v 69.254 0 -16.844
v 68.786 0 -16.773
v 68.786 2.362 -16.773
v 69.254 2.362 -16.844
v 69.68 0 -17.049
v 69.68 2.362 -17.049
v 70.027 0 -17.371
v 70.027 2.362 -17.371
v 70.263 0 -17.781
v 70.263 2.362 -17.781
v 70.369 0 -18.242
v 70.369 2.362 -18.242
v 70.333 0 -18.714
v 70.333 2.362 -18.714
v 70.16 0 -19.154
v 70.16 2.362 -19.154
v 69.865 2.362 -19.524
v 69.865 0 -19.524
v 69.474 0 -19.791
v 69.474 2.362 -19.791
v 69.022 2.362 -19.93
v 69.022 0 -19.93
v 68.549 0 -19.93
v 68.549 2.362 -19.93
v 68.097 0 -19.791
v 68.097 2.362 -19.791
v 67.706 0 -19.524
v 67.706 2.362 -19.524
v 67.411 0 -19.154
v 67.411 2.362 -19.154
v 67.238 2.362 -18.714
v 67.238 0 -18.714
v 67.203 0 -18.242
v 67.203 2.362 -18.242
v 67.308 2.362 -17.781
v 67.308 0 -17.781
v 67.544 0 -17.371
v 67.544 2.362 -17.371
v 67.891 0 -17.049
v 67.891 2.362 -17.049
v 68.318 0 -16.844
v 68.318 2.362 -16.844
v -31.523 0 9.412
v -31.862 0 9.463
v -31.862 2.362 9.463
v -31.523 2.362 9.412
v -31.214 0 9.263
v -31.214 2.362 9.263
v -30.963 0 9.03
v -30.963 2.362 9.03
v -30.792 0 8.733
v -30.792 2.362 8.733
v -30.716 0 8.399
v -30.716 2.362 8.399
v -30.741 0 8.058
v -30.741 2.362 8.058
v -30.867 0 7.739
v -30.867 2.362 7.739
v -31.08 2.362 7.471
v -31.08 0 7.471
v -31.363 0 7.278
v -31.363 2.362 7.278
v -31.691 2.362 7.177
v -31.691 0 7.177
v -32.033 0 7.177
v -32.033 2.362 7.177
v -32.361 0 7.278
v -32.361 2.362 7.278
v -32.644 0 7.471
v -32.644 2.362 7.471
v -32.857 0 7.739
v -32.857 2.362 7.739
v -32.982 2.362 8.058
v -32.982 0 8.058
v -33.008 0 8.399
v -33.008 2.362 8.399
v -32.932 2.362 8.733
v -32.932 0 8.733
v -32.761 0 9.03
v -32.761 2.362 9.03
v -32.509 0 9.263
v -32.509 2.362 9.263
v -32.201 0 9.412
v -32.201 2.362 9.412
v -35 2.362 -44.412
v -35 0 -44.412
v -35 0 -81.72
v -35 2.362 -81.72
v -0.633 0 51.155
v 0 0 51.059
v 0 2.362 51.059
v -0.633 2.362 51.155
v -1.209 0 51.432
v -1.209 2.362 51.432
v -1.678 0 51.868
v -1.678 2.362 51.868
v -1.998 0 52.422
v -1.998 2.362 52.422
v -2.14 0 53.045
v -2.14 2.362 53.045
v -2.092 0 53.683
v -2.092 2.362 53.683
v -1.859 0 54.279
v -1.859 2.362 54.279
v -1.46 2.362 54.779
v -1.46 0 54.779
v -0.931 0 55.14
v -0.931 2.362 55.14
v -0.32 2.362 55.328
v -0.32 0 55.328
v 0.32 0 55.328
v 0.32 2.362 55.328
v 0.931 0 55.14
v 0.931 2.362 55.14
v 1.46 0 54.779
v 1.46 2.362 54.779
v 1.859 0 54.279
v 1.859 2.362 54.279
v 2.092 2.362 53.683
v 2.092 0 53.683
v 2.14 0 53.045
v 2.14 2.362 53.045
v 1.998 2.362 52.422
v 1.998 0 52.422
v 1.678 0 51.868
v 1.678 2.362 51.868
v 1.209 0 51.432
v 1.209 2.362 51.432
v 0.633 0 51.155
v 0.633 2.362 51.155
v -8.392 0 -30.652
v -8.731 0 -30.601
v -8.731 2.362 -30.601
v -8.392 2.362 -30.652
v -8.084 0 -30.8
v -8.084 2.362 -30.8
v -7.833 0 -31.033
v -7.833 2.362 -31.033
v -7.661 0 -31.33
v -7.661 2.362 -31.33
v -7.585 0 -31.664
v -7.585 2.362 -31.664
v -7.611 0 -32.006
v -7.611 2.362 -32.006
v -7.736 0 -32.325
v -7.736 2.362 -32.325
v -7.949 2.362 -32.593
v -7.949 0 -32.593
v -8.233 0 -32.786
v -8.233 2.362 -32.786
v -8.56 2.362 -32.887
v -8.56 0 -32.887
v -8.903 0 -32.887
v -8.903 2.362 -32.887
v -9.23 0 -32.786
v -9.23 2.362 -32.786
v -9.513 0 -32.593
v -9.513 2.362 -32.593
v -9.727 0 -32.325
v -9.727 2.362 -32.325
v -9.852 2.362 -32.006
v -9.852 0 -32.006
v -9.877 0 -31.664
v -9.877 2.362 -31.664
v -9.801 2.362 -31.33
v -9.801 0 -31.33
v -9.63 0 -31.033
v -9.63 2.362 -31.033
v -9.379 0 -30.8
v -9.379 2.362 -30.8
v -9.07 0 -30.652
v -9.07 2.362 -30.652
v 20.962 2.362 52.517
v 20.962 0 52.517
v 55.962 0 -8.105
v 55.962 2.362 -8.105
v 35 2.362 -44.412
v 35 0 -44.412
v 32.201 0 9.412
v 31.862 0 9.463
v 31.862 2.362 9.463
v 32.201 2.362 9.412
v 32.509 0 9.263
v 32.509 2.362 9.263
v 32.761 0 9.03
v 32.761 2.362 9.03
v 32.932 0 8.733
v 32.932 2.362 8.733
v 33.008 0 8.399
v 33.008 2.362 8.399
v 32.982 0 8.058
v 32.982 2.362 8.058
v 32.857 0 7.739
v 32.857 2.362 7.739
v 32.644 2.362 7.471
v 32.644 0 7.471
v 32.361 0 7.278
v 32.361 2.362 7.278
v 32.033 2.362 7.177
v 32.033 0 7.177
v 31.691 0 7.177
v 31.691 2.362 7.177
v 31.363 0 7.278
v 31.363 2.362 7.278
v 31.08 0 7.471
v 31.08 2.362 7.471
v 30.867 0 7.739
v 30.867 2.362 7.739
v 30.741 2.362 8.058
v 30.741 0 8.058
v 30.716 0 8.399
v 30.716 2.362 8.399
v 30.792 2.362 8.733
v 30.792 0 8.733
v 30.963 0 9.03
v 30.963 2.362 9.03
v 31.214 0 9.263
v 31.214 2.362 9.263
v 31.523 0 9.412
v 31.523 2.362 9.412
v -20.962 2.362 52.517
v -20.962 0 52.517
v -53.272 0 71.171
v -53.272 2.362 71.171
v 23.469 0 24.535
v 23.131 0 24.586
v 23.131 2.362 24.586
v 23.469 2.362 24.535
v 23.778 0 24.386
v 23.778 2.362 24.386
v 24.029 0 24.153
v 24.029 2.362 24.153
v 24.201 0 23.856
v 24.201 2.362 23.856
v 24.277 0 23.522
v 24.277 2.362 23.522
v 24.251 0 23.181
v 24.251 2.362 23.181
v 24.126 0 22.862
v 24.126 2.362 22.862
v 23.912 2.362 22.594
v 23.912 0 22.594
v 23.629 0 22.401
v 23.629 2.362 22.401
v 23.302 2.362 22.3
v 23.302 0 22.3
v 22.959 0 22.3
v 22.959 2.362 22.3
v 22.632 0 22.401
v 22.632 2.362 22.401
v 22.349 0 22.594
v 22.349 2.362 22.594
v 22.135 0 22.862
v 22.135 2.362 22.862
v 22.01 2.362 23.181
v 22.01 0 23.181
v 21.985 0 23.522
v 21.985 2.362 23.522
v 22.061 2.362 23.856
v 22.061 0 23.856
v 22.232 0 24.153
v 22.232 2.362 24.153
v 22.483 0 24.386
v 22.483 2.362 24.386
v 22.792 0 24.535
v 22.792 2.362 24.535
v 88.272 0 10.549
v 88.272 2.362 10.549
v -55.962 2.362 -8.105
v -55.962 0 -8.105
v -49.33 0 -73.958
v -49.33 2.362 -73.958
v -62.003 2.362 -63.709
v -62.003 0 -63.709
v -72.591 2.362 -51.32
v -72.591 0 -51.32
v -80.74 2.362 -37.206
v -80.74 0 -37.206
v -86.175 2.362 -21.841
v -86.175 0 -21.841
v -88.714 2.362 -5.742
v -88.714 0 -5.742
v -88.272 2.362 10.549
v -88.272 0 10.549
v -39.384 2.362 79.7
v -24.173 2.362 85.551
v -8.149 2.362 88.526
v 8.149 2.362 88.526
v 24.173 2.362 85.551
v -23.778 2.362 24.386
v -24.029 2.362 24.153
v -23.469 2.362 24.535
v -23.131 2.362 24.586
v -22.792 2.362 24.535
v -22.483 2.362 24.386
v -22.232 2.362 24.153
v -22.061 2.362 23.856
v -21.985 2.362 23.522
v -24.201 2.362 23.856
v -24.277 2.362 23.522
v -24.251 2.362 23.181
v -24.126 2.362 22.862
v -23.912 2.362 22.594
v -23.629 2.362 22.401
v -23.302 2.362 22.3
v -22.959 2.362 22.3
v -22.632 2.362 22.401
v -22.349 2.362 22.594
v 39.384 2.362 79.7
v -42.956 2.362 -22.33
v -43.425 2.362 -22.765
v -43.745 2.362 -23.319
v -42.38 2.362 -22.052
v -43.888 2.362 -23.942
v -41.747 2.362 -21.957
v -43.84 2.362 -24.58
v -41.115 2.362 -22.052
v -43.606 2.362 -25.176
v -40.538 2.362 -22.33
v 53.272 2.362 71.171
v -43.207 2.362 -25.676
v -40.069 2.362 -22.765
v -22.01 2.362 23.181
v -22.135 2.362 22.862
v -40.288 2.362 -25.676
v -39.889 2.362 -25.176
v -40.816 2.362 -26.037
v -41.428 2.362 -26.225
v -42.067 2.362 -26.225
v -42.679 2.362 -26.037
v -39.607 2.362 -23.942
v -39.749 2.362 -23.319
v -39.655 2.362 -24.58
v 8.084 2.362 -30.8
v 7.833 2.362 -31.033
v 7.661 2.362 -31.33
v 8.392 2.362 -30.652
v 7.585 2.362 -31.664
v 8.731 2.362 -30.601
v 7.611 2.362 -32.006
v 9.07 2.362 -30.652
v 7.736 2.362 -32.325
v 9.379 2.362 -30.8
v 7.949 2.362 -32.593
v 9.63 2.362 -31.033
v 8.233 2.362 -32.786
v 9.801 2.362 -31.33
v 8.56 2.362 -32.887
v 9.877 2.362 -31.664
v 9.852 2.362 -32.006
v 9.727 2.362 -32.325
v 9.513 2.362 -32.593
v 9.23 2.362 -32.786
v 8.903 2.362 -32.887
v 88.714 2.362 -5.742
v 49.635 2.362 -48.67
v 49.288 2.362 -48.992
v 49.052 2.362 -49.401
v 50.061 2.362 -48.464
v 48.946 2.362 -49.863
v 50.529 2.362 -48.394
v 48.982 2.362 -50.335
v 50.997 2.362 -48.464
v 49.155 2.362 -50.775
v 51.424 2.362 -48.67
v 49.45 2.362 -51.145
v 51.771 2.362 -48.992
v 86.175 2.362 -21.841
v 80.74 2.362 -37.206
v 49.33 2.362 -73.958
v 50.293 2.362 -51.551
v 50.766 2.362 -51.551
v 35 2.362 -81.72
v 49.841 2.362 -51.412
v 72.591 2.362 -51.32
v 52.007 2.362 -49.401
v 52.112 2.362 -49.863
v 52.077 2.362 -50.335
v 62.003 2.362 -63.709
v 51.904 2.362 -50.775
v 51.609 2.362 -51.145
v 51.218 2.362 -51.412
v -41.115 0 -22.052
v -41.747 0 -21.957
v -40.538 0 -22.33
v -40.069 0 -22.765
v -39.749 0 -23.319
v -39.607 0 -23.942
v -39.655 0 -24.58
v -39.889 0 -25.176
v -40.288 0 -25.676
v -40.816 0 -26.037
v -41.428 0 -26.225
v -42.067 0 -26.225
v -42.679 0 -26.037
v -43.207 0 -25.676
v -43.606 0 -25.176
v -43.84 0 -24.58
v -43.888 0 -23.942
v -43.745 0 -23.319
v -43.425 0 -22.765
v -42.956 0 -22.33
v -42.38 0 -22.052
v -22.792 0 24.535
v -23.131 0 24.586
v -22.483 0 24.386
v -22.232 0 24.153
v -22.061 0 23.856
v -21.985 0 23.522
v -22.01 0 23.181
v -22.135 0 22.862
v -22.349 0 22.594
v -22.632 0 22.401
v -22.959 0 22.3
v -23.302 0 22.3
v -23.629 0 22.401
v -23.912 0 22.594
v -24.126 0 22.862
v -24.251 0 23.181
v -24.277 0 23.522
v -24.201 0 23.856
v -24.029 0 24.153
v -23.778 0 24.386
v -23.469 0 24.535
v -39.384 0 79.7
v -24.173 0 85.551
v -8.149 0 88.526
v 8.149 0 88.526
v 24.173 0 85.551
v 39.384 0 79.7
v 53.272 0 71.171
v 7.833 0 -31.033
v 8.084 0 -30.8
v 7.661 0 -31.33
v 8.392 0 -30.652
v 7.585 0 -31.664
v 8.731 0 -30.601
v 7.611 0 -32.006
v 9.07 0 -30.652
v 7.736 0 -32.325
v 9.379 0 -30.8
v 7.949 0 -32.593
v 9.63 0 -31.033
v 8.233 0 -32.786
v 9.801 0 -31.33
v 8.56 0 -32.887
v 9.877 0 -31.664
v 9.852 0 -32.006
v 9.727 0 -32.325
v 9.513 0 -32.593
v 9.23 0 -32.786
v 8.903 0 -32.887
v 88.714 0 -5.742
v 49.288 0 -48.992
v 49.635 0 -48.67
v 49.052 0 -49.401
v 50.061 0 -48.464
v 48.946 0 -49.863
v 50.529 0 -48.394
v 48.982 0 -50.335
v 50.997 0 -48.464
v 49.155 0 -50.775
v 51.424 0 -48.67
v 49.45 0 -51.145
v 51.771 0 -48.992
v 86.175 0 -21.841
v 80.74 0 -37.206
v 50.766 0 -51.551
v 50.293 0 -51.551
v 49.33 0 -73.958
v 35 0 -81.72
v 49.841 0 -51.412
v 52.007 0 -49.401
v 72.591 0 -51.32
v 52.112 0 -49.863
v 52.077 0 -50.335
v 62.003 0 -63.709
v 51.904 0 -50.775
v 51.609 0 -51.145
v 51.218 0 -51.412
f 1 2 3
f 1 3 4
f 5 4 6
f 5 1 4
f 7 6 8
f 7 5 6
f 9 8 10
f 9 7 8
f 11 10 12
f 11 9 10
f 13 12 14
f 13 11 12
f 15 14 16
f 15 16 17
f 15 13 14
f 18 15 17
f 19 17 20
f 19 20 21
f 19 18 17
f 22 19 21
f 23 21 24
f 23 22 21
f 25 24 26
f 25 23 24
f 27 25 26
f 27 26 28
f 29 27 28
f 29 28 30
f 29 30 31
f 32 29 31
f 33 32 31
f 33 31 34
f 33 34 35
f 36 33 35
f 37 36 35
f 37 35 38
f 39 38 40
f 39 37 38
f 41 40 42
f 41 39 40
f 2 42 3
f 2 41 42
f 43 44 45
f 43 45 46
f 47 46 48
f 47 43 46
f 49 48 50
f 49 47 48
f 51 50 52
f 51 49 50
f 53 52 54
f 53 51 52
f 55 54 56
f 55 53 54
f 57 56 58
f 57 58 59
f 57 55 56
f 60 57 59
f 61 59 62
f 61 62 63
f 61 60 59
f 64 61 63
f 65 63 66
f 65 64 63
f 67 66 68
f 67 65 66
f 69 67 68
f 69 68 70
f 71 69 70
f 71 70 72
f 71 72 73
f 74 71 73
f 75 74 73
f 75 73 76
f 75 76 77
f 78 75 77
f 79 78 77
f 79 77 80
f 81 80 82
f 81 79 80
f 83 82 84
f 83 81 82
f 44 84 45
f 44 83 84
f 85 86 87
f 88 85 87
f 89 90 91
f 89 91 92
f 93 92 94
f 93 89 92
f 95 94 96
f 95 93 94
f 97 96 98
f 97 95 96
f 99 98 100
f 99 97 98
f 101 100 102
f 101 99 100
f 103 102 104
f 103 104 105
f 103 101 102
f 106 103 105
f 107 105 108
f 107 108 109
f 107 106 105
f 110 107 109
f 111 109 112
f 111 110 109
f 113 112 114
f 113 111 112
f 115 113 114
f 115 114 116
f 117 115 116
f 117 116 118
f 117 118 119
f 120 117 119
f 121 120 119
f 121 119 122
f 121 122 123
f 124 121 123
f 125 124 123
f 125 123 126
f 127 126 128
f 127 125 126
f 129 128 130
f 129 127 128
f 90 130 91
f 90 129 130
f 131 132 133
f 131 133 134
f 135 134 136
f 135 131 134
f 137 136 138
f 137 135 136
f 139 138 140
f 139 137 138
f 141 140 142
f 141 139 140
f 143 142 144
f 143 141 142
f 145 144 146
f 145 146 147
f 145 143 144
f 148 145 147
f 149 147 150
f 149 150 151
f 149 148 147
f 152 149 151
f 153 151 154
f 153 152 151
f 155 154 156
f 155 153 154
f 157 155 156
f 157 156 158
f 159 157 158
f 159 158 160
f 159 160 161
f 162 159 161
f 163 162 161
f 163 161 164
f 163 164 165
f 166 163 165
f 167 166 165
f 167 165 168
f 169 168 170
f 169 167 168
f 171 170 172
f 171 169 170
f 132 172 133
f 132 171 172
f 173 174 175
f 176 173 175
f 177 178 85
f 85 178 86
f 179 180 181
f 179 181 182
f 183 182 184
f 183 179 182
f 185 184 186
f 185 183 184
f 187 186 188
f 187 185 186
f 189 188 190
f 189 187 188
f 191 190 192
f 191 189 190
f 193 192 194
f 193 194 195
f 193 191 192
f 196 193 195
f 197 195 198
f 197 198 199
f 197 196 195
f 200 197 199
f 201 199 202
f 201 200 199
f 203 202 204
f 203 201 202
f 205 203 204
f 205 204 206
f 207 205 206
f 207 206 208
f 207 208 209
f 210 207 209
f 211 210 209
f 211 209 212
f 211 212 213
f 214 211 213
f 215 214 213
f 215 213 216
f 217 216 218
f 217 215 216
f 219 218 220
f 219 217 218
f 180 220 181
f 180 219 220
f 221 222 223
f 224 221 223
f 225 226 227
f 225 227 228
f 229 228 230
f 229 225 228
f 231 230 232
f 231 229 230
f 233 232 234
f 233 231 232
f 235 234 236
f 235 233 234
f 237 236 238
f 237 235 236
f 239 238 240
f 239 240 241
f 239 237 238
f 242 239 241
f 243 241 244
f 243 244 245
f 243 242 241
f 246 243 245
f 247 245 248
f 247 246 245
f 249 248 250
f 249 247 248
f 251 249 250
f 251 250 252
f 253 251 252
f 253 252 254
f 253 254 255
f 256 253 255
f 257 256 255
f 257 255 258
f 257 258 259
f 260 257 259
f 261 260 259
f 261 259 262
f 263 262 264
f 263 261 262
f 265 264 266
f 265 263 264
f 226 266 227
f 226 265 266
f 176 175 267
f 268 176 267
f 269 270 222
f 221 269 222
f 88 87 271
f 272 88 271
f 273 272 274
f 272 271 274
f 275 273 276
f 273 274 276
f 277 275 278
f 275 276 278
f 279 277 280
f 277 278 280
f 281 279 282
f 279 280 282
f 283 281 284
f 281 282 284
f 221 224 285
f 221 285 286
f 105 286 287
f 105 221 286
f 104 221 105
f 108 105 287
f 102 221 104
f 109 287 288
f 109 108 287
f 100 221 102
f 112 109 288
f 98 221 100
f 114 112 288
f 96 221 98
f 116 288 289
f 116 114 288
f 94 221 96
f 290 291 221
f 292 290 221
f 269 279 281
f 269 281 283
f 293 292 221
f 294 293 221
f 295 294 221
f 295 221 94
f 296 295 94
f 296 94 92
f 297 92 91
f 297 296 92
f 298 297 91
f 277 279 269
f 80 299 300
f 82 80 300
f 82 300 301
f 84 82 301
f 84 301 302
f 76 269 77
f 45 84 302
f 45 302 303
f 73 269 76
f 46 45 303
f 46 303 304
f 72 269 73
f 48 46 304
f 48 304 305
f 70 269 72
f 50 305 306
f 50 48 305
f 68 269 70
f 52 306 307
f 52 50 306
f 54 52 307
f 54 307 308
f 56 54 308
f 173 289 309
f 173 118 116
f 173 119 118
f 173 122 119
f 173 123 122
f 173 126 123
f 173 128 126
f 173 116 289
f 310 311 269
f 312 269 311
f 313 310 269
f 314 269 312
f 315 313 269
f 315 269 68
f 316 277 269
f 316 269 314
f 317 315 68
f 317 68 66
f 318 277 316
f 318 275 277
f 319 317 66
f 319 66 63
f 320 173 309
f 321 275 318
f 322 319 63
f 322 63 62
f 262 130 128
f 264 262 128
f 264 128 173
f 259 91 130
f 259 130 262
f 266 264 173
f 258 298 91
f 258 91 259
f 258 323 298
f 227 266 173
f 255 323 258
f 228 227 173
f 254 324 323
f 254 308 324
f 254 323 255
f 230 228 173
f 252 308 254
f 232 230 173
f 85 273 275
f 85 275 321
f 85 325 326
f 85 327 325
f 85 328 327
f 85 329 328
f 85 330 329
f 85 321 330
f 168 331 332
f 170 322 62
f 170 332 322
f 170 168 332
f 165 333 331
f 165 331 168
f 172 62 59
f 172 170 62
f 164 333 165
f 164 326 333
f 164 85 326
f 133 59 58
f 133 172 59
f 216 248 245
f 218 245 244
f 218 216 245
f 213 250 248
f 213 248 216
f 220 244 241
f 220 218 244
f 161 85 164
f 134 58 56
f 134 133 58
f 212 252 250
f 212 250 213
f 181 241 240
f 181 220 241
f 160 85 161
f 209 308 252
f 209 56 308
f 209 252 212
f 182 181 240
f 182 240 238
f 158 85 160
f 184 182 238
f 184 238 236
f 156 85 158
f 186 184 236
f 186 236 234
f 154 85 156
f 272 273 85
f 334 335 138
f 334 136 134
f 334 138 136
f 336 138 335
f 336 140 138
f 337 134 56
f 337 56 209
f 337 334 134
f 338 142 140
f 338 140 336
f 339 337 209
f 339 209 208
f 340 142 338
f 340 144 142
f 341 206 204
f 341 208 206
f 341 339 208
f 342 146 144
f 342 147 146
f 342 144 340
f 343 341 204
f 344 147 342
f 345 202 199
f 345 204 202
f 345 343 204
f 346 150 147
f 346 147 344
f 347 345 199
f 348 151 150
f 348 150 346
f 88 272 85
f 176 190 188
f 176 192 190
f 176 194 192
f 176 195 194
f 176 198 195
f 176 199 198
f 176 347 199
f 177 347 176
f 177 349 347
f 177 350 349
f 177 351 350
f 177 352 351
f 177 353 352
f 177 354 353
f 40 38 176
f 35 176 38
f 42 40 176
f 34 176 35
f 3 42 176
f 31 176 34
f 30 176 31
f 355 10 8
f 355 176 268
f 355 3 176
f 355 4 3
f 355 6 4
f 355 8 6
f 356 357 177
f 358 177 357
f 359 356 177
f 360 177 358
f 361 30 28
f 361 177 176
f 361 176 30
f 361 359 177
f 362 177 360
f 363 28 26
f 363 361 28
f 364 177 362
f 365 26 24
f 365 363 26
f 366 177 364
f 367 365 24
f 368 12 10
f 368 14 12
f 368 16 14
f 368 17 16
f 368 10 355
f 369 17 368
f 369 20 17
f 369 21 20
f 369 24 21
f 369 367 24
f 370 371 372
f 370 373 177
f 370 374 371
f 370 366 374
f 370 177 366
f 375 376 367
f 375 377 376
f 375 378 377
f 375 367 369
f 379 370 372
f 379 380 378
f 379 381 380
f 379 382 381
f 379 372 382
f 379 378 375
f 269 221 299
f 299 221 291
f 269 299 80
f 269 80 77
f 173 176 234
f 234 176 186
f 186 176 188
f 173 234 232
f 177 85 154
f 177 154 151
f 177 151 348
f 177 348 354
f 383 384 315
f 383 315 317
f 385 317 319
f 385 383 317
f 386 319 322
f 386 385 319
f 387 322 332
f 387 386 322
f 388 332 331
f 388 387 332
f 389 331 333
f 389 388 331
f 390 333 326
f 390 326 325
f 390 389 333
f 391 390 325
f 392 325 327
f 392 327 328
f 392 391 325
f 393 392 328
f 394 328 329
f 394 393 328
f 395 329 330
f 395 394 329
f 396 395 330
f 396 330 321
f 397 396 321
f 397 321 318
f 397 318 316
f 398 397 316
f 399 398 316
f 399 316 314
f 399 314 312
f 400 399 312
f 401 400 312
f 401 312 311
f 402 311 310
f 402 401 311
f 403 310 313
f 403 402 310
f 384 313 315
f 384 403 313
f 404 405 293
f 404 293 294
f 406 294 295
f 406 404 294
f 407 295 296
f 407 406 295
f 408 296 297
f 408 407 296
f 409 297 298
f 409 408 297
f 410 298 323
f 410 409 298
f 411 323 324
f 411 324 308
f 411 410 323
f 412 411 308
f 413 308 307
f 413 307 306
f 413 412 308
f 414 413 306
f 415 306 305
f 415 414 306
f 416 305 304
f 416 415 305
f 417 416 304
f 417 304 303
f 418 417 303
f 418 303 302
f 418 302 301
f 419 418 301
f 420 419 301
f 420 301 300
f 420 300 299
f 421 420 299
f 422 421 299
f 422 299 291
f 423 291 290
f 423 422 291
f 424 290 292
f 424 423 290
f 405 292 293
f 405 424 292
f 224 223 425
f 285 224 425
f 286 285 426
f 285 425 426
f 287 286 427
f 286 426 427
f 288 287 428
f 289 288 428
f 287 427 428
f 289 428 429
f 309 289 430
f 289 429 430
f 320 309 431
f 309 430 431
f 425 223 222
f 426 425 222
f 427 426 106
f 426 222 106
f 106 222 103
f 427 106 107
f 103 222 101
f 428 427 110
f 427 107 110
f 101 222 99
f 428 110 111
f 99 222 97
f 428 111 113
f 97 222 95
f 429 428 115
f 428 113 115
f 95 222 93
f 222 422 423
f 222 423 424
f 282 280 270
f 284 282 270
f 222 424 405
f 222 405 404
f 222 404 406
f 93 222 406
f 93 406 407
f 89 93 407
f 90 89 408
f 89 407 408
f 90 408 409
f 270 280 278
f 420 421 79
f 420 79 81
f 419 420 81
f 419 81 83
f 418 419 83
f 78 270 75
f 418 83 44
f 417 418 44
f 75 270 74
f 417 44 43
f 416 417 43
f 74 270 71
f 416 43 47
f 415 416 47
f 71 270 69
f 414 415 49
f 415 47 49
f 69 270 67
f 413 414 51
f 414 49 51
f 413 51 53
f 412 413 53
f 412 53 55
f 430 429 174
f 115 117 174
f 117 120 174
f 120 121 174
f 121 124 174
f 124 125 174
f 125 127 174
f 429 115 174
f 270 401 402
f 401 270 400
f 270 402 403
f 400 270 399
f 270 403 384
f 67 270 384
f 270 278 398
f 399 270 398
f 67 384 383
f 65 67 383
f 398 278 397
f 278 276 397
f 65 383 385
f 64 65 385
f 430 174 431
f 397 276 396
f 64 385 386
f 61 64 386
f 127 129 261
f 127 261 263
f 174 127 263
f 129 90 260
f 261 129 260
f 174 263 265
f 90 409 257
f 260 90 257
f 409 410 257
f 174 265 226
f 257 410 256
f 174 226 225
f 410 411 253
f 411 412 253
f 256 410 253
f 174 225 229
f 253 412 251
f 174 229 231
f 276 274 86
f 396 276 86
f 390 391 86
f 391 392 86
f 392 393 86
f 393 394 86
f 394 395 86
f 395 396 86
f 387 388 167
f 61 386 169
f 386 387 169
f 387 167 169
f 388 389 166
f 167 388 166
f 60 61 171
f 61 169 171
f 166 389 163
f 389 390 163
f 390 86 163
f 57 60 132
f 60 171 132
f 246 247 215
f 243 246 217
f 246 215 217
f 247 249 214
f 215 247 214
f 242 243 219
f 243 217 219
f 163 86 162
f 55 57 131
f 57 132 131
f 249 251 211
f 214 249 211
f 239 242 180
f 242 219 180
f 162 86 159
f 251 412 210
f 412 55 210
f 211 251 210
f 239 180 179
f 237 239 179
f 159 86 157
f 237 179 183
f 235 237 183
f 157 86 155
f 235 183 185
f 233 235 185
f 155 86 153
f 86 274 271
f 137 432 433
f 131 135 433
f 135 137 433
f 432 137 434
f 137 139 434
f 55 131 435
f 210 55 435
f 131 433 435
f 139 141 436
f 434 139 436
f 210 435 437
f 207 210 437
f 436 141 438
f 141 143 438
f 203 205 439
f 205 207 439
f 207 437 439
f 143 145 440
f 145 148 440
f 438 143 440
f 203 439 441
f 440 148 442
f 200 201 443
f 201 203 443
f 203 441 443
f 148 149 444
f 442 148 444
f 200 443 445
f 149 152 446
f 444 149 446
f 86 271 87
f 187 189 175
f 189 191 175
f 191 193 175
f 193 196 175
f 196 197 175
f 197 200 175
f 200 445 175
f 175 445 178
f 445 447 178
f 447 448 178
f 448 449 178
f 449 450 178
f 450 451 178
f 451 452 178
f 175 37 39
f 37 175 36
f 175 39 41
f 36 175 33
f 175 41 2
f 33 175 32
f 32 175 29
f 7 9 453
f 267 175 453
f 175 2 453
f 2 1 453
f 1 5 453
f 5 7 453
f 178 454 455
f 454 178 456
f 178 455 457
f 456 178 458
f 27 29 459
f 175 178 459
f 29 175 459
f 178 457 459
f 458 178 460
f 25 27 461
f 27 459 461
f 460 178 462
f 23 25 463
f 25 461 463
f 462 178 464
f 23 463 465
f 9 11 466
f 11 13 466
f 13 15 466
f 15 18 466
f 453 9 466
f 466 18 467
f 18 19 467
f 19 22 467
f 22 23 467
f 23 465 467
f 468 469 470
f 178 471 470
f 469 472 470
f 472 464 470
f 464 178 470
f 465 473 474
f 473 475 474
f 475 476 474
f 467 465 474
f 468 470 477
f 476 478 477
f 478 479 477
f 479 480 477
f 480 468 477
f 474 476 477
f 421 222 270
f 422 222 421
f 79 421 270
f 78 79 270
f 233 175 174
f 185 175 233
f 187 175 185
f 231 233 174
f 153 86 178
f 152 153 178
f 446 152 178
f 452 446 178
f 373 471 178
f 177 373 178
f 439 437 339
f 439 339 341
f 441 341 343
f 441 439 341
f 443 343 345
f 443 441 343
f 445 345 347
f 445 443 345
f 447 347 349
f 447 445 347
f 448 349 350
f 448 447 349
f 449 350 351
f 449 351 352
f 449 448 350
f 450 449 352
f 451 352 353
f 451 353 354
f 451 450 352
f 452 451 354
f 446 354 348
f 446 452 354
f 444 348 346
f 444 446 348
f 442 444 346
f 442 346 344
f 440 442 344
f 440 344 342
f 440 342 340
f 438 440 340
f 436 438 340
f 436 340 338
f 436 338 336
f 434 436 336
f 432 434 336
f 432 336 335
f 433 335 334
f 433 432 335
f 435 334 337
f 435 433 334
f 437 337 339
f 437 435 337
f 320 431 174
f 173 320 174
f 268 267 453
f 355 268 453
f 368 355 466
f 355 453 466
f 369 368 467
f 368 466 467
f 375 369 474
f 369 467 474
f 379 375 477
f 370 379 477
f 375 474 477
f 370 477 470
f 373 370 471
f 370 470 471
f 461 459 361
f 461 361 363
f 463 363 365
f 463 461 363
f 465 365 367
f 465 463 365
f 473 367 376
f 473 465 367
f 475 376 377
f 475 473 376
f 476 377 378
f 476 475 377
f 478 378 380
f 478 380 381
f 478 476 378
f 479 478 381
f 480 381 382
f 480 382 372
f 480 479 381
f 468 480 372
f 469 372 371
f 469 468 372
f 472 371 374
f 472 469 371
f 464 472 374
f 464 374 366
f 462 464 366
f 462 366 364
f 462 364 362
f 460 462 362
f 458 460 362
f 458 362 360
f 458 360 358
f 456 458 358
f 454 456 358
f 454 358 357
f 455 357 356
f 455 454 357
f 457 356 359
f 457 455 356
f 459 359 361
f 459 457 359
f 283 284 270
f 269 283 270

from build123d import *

# Parameters (mm, degrees)
SKETCH1_R           = 2.1463
SKETCH1_R_2         = 1.14935
SKETCH1_R_3         = 1.5875
BOSS_EXTRUDE1_DEPTH = 2.3622


with BuildPart() as part:
    # Sketch1 → Boss-Extrude1 (new body)
    with BuildSketch(Plane(origin=(0, 0, 0), x_dir=(1, 0, 0), z_dir=(0, 1, 0))):
        with BuildLine():
            Line((-35, 44.411902139), (-35, 81.720315712))
            ThreePointArc((-35, 81.720315712), (-76.989658396, 44.45), (-88.271869412, -10.549268723))
            Line((-88.271869412, -10.549268723), (-55.961835482, 8.104938063))
            Line((-55.961835482, 8.104938063), (-20.961835482, -52.516840202))
            Line((-20.961835482, -52.516840202), (-53.271869412, -71.171046988))
            ThreePointArc((-53.271869412, -71.171046988), (0, -88.9), (53.271869412, -71.171046988))
            Line((53.271869412, -71.171046988), (20.961835482, -52.516840202))
            Line((20.961835482, -52.516840202), (55.961835482, 8.104938063))
            Line((55.961835482, 8.104938063), (88.271869412, -10.549268723))
            ThreePointArc((88.271869412, -10.549268723), (76.989658396, 44.45), (35, 81.720315712))
            Line((35, 81.720315712), (35, 44.411902139))
            Line((35, 44.411902139), (-35, 44.411902139))
        make_face()
        with Locations(Location((-41.747414599, 24.102881057, 0), (0, 0, 270))):
            Circle(SKETCH1_R, mode=Mode.SUBTRACT)
        with Locations(Location((-8.73125, 31.75, 0), (0, 0, 270))):
            Circle(SKETCH1_R_2, mode=Mode.SUBTRACT)
        with Locations(Location((50.529406911, 49.981355026, 0), (0, 0, 270))):
            Circle(SKETCH1_R_3, mode=Mode.SUBTRACT)
        with Locations(Location((0, -53.205762114, 0), (0, 0, 90))):
            Circle(SKETCH1_R, mode=Mode.SUBTRACT)
        with Locations(Location((68.785656911, 18.36060247, 0), (0, 0, 270))):
            Circle(SKETCH1_R_3, mode=Mode.SUBTRACT)
        with Locations(Location((8.73125, 31.75, 0), (0, 0, 270))):
            Circle(SKETCH1_R_2, mode=Mode.SUBTRACT)
        with Locations(Location((31.86193157, -8.313515693, 0), (0, 0, 270))):
            Circle(SKETCH1_R_2, mode=Mode.SUBTRACT)
        with Locations(Location((23.13068157, -23.436484307, 0), (0, 0, 270))):
            Circle(SKETCH1_R_2, mode=Mode.SUBTRACT)
        with Locations(Location((-31.86193157, -8.313515693, 0), (0, 0, 270))):
            Circle(SKETCH1_R_2, mode=Mode.SUBTRACT)
        with Locations(Location((-23.13068157, -23.436484307, 0), (0, 0, 270))):
            Circle(SKETCH1_R_2, mode=Mode.SUBTRACT)
    extrude(amount=BOSS_EXTRUDE1_DEPTH)


solid = part.part
